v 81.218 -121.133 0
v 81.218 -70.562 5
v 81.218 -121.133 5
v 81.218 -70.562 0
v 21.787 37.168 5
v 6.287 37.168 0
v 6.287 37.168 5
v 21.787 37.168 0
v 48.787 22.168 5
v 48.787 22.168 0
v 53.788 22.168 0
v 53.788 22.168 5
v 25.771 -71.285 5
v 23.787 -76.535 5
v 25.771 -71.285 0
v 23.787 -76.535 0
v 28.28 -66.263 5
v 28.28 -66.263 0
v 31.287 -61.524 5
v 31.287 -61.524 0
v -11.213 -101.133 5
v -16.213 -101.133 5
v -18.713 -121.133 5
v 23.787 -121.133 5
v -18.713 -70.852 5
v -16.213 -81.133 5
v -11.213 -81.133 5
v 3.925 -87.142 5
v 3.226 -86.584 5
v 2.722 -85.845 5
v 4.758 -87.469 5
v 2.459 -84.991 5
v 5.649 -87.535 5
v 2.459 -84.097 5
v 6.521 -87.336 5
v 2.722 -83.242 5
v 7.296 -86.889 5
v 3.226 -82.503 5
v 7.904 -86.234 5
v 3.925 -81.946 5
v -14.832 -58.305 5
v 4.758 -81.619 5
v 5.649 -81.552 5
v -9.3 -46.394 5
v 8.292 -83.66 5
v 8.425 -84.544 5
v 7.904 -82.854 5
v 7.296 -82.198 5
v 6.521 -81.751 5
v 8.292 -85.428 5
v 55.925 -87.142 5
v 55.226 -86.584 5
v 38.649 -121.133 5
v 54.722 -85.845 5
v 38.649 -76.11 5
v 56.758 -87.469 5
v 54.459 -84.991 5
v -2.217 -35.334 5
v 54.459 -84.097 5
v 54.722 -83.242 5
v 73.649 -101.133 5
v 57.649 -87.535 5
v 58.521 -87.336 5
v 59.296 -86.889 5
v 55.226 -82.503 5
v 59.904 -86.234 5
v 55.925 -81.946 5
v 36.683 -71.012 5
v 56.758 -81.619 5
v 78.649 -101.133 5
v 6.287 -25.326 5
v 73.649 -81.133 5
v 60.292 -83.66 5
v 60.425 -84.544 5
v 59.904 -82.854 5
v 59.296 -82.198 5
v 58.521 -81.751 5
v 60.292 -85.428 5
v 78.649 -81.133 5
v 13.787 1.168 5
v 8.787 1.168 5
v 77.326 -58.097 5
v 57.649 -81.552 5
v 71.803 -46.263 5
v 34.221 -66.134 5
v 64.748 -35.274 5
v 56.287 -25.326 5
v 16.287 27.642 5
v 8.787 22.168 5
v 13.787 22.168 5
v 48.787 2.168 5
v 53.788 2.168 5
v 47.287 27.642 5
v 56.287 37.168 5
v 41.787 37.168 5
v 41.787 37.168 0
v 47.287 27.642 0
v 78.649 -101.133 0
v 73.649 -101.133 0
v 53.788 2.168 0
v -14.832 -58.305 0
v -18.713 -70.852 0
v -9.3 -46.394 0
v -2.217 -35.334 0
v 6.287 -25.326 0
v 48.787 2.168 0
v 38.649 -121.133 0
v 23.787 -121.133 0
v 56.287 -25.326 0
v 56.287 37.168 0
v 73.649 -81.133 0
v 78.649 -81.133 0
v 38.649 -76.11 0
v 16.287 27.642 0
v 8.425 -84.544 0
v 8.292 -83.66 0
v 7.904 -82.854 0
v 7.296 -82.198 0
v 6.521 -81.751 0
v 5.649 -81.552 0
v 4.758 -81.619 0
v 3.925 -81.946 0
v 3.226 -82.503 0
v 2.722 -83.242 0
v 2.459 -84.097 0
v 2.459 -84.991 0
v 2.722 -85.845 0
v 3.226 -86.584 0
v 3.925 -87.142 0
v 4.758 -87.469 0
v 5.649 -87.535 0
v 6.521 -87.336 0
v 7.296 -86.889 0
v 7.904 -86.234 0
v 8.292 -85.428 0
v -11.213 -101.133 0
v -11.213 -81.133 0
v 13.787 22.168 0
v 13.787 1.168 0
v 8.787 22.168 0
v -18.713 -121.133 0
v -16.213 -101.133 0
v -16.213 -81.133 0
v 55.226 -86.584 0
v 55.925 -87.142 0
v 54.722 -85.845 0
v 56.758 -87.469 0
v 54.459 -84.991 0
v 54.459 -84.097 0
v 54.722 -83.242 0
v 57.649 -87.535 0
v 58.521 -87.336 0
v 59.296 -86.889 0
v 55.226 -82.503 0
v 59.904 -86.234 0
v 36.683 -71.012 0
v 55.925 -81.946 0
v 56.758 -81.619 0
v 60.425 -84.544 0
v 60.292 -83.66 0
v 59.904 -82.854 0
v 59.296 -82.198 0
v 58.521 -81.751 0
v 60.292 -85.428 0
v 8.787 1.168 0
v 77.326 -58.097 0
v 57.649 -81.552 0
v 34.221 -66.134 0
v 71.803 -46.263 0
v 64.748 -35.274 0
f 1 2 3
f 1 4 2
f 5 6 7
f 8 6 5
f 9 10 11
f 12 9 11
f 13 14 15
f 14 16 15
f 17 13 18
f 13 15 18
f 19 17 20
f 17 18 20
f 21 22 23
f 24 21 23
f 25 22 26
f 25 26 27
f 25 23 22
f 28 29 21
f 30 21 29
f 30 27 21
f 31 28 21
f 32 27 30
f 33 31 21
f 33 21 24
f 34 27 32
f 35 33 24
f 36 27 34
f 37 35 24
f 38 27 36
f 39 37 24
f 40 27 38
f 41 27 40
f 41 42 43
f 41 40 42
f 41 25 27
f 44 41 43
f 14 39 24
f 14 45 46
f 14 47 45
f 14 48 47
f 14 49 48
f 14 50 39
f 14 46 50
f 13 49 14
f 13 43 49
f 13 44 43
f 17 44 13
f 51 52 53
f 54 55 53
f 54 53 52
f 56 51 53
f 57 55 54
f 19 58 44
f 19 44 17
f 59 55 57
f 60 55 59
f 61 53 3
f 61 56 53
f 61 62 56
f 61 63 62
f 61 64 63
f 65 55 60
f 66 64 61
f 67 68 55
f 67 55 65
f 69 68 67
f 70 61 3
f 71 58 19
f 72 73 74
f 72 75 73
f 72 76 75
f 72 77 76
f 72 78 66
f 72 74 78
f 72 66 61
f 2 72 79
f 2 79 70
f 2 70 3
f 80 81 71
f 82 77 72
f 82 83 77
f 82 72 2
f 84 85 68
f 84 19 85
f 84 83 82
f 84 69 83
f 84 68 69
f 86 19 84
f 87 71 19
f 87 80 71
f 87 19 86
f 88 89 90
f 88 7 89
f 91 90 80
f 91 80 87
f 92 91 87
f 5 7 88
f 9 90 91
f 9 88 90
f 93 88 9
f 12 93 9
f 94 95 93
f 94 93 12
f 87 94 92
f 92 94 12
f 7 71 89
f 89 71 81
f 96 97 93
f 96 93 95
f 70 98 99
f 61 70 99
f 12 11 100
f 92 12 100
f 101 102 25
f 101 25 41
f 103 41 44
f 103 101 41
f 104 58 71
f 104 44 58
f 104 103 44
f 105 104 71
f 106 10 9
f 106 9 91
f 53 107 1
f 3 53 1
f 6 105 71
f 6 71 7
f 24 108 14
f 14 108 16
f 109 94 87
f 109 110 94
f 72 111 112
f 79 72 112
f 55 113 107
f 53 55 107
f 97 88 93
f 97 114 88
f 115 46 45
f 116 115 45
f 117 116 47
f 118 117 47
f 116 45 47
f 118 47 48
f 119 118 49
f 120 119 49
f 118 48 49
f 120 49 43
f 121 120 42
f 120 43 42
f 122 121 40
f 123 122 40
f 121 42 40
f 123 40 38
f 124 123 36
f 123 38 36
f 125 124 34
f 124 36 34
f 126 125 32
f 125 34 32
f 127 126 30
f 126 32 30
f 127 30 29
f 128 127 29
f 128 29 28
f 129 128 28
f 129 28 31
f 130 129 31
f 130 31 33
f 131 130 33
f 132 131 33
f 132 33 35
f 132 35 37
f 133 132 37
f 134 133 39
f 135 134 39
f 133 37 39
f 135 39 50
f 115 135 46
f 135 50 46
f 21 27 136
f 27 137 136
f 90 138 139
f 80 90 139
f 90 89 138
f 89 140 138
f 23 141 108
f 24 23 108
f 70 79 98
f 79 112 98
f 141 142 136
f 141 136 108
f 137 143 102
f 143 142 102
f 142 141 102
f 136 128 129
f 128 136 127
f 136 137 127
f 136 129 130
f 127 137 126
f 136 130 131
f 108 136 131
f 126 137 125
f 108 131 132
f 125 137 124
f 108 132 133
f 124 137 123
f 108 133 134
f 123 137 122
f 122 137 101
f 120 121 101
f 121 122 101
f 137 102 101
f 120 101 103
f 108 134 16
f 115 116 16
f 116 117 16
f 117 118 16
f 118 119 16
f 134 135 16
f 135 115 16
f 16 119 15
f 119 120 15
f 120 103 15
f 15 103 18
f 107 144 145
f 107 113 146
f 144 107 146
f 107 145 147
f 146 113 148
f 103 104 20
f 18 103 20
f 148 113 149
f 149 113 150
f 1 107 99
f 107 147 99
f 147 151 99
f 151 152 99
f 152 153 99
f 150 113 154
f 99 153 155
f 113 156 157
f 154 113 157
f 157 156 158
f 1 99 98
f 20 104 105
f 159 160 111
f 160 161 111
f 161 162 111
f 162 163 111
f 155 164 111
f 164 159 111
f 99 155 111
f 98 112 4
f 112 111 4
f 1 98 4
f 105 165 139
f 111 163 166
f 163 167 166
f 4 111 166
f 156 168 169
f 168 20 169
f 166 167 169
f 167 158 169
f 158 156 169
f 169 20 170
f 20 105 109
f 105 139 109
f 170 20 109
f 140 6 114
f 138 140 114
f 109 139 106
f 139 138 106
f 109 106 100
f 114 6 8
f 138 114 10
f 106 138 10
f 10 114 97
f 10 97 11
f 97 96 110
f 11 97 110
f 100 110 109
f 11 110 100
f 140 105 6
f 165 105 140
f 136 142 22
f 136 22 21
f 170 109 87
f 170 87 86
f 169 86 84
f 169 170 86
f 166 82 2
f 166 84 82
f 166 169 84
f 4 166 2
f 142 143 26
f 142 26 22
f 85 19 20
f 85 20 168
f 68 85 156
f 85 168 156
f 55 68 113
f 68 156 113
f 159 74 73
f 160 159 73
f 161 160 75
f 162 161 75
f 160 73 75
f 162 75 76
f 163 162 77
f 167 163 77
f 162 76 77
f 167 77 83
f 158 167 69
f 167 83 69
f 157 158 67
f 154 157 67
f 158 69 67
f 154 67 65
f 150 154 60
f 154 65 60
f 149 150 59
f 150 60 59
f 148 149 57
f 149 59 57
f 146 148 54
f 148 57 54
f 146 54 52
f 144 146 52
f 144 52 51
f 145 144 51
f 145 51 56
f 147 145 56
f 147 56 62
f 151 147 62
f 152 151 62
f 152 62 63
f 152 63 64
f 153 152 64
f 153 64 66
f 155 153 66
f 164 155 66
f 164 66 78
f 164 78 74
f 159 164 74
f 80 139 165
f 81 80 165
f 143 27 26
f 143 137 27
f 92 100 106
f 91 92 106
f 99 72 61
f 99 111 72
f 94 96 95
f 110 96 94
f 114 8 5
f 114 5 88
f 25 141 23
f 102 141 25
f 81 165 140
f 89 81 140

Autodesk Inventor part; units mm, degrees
ref_plane "YZ Plane" through (0, 0, 0) normal (1, 0, 0) x (0, 1, 0)
ref_plane "XZ Plane" through (0, 0, 0) normal (0, 1, 0) x (-1, 0, 0)
ref_plane "XY Plane" through (0, 0, 0) normal (0, 0, 1) x (1, 0, 0)
sketch "Sketch1" plane through (0, 0, 0) normal (0, 0, 1) x (1, 0, 0)
  line L0 (48.7872, 31.5555) -> (48.7872, -28.4445)
  line L1 (13.7872, 31.5555) -> (13.7872, -28.4445)
  arc A0 (13.7872, -28.4445) -> (-11.2128, -71.7458) centre (76.1621, -93.3242) ccw
  line L2 (13.7872, -28.4445) -> (-11.2128, -71.7458) construction
  line L3 (13.7872, -28.4445) -> (63.7872, -28.4445) construction
  line L4 (-11.2128, -71.7458) -> (-11.2128, -121.7458)
  arc A1 (73.6491, -71.1938) -> (48.7872, -28.4445) centre (-13.5876, -93.3242) ccw
  line L5 (73.6491, -71.1938) -> (73.6491, -121.1332)
  line L6 (23.7872, -121.7458) -> (23.7872, -76.5352)
  arc A2 (31.2872, -61.5241) -> (23.7872, -76.5352) centre (76.1621, -93.3242) ccw
  arc A3 (38.6491, -76.1101) -> (31.2872, -61.5241) centre (-13.5876, -93.3242) ccw
  line L7 (38.6491, -76.1101) -> (38.6491, -121.1332)
  line L8 (-18.7128, -121.1332) -> (-18.7128, -70.8519)
  arc A4 (6.2872, -25.326) -> (-18.7128, -70.8519) centre (76.1621, -93.3242) ccw
  line L9 (6.2872, -25.326) -> (6.2872, 37.168)
  line L10 (6.2872, 37.168) -> (56.2872, 37.168)
  line L11 (56.2872, 37.168) -> (56.2872, -25.326)
  arc A5 (81.2182, -70.5622) -> (56.2872, -25.326) centre (-13.5876, -93.3242) ccw
  line L12 (81.2182, -70.5622) -> (81.2182, -121.1332)
  line L13 (-18.7128, -121.1332) -> (81.2182, -121.1332)
  line L14 (13.7872, 31.5555) -> (13.7872, 37.168)
  line L15 (48.7872, 31.5555) -> (48.7872, 37.168)
  line L16 (33.6491, -121.1332) -> (33.6491, -85.5895)
  line L17 (28.7872, -85.5895) -> (28.7872, -121.7458)
  line L18 (23.7872, -85.5895) -> (28.7872, -85.5895)
  line L19 (33.6491, -85.5895) -> (38.6491, -85.5895)
  line L20 (48.4283, 31.5555) -> (48.7872, 31.5555)
  line L21 (13.7872, 2.168) -> (13.7872, 22.168)
  line L22 (48.7872, 2.168) -> (48.7872, 22.168)
  line L23 (73.6491, -101.1332) -> (73.6491, -81.1332)
  line L24 (-11.2128, -81.1332) -> (-11.2128, -101.1332)
  line L25 (79.0378, -80.1332) -> (84.0378, -80.1332)
  line L26 (84.0378, -80.1332) -> (84.0378, -101.1332)
  line L27 (48.7872, 1.168) -> (48.7872, 22.168)
  line L28 (8.7872, 22.168) -> (13.7872, 22.168)
  line L29 (13.7872, 22.168) -> (13.7872, 1.168)
  line L30 (13.7872, 1.168) -> (8.7872, 1.168)
  line L31 (8.7872, 1.168) -> (8.7872, 22.168)
  line L32 (48.7872, 22.168) -> (53.7877, 22.168)
  line L33 (53.7877, 22.168) -> (53.7877, 2.168)
  line L34 (53.7877, 2.168) -> (48.7872, 2.168)
  line L35 (48.7872, 2.168) -> (48.7872, 22.168)
  line L36 (21.7872, 37.168) -> (16.2872, 27.6417)
  line L37 (21.7872, 37.168) -> (32.7872, 37.168) construction
  line L38 (16.2872, 27.6417) -> (47.2872, 27.6417)
  line L39 (47.2872, 27.6417) -> (41.7872, 37.168)
  line L40 (-11.2128, -81.1332) -> (-16.2128, -81.1332)
  line L41 (-16.2128, -81.1332) -> (-16.2128, -101.1332)
  line L42 (-16.2128, -101.1332) -> (-11.2128, -101.1332)
  line L43 (-11.2128, -101.1332) -> (-11.2128, -81.1332)
  line L44 (73.6491, -81.1332) -> (78.6491, -81.1332)
  line L45 (78.6491, -81.1332) -> (78.6491, -101.1332)
  line L46 (78.6491, -101.1332) -> (73.6491, -101.1332)
  line L47 (73.6491, -101.1332) -> (73.6491, -81.1332)
  point P0 (0, 0)
  point P1 (-11.2128, -121.1332)
  point P2 (23.7872, -121.1332)
  point P3 (36.2872, -121.7458)
  point P4 (71.2872, -121.7458)
  point P5 (28.7872, -121.1332)
  point P6 (31.2872, -121.7458)
  point P7 (81.2182, -80.1332)
  point P8 (13.7872, 22.168)
  point P9 (13.7872, 1.168)
  point P10 (48.7872, 2.168)
  point P11 (48.7872, 22.168)
  dimension "d0" = 35
  dimension "d1" = 60
  dimension "d2" = 50
  dimension "d3" = 120
  dimension "d4" = 90
  dimension "d5" = 50
  dimension "d6" = 35
  dimension "d7" = 7.5
  dimension "d12" = 5
  dimension "d16" = 7.5
  dimension "d22" = 158.3013
  dimension "d29" = 0
  dimension "d31" = 21
  dimension "d36" = 5
  dimension "d37" = 21
  dimension "d39" = 15
  dimension "d44" = 2.5
  dimension "d45" = 15
  dimension "d46" = 5.0004
  dimension "d47" = 20
  dimension "d48" = 90
  dimension "d49" = 90
  dimension "d50" = 2.8196
  dimension "d51" = 10.3887
  dimension "d52" = 27.7505
  dimension "d53" = 30.2501
  dimension "d54" = 45.3887
  dimension "d55" = 55.2505
  dimension "d58" = 111.6887
  dimension "d59" = 51.6887
  dimension "d60" = 5.4563
  dimension "d61" = 84.0378
  dimension "d62" = 80.1333
  dimension "d63" = 9.571
  dimension "d64" = 1
  dimension "d66" = 12.7505
  dimension "d67" = 41.6125
  dimension "d68" = 102.3013
  dimension "d69" = 82.3013
  dimension "d70" = 81.3013
  dimension "d71" = 47.7505
  dimension "d72" = 41.6125
  dimension "d73" = 52.7505
  dimension "d74" = 41.6125
  dimension "d75" = 55.2505
  dimension "d76" = 41
  dimension "d77" = 41.6125
  dimension "d78" = 60.2505
  dimension "d79" = 41
  dimension "d80" = 41.6125
  dimension "d81" = 102.3013
  dimension "d82" = 82.3013
  dimension "d83" = 1
  dimension "d84" = 21
  dimension "d85" = 95.2505
  dimension "d86" = 41
  dimension "d87" = 11
  dimension "d88" = 120
  dimension "d89" = 31
  dimension "d90" = 11
  dimension "d91" = 60
  dimension "d92" = 14.5
  dimension "d93" = 5
  dimension "d94" = 20
extrude "Extrusion1" add sketch "Sketch1" along normal blind 5 contours L15 L10 L11 A5 L12 L13 L5 L46 L45 L44 A1 L0 L34 L33 L32 | L0 A1 L5 L13 L7 A3 A2 L6 L4 A0 L1 L14 L10 L36 L38 L39 L15 | L14 L1 L28 L31 L30 A0 L4 L40 L41 L42 L13 L8 A4 L9 L10
sketch "Sketch2" plane through (0, 0, 5) normal (0, 0, 1) x (1, 0, 0)
  circle A0 centre (57.4252, -84.5438) radius 3
  circle A1 centre (5.4252, -84.5438) radius 3
  point P0 (0, 0)
  dimension "d99" = 6
  dimension "d100" = 6
  dimension "d101" = 52
extrude "Extrusion3" cut sketch "Sketch2" against normal blind 5
equation "\"d16\" = d7"
properties part number "newmiddle"
